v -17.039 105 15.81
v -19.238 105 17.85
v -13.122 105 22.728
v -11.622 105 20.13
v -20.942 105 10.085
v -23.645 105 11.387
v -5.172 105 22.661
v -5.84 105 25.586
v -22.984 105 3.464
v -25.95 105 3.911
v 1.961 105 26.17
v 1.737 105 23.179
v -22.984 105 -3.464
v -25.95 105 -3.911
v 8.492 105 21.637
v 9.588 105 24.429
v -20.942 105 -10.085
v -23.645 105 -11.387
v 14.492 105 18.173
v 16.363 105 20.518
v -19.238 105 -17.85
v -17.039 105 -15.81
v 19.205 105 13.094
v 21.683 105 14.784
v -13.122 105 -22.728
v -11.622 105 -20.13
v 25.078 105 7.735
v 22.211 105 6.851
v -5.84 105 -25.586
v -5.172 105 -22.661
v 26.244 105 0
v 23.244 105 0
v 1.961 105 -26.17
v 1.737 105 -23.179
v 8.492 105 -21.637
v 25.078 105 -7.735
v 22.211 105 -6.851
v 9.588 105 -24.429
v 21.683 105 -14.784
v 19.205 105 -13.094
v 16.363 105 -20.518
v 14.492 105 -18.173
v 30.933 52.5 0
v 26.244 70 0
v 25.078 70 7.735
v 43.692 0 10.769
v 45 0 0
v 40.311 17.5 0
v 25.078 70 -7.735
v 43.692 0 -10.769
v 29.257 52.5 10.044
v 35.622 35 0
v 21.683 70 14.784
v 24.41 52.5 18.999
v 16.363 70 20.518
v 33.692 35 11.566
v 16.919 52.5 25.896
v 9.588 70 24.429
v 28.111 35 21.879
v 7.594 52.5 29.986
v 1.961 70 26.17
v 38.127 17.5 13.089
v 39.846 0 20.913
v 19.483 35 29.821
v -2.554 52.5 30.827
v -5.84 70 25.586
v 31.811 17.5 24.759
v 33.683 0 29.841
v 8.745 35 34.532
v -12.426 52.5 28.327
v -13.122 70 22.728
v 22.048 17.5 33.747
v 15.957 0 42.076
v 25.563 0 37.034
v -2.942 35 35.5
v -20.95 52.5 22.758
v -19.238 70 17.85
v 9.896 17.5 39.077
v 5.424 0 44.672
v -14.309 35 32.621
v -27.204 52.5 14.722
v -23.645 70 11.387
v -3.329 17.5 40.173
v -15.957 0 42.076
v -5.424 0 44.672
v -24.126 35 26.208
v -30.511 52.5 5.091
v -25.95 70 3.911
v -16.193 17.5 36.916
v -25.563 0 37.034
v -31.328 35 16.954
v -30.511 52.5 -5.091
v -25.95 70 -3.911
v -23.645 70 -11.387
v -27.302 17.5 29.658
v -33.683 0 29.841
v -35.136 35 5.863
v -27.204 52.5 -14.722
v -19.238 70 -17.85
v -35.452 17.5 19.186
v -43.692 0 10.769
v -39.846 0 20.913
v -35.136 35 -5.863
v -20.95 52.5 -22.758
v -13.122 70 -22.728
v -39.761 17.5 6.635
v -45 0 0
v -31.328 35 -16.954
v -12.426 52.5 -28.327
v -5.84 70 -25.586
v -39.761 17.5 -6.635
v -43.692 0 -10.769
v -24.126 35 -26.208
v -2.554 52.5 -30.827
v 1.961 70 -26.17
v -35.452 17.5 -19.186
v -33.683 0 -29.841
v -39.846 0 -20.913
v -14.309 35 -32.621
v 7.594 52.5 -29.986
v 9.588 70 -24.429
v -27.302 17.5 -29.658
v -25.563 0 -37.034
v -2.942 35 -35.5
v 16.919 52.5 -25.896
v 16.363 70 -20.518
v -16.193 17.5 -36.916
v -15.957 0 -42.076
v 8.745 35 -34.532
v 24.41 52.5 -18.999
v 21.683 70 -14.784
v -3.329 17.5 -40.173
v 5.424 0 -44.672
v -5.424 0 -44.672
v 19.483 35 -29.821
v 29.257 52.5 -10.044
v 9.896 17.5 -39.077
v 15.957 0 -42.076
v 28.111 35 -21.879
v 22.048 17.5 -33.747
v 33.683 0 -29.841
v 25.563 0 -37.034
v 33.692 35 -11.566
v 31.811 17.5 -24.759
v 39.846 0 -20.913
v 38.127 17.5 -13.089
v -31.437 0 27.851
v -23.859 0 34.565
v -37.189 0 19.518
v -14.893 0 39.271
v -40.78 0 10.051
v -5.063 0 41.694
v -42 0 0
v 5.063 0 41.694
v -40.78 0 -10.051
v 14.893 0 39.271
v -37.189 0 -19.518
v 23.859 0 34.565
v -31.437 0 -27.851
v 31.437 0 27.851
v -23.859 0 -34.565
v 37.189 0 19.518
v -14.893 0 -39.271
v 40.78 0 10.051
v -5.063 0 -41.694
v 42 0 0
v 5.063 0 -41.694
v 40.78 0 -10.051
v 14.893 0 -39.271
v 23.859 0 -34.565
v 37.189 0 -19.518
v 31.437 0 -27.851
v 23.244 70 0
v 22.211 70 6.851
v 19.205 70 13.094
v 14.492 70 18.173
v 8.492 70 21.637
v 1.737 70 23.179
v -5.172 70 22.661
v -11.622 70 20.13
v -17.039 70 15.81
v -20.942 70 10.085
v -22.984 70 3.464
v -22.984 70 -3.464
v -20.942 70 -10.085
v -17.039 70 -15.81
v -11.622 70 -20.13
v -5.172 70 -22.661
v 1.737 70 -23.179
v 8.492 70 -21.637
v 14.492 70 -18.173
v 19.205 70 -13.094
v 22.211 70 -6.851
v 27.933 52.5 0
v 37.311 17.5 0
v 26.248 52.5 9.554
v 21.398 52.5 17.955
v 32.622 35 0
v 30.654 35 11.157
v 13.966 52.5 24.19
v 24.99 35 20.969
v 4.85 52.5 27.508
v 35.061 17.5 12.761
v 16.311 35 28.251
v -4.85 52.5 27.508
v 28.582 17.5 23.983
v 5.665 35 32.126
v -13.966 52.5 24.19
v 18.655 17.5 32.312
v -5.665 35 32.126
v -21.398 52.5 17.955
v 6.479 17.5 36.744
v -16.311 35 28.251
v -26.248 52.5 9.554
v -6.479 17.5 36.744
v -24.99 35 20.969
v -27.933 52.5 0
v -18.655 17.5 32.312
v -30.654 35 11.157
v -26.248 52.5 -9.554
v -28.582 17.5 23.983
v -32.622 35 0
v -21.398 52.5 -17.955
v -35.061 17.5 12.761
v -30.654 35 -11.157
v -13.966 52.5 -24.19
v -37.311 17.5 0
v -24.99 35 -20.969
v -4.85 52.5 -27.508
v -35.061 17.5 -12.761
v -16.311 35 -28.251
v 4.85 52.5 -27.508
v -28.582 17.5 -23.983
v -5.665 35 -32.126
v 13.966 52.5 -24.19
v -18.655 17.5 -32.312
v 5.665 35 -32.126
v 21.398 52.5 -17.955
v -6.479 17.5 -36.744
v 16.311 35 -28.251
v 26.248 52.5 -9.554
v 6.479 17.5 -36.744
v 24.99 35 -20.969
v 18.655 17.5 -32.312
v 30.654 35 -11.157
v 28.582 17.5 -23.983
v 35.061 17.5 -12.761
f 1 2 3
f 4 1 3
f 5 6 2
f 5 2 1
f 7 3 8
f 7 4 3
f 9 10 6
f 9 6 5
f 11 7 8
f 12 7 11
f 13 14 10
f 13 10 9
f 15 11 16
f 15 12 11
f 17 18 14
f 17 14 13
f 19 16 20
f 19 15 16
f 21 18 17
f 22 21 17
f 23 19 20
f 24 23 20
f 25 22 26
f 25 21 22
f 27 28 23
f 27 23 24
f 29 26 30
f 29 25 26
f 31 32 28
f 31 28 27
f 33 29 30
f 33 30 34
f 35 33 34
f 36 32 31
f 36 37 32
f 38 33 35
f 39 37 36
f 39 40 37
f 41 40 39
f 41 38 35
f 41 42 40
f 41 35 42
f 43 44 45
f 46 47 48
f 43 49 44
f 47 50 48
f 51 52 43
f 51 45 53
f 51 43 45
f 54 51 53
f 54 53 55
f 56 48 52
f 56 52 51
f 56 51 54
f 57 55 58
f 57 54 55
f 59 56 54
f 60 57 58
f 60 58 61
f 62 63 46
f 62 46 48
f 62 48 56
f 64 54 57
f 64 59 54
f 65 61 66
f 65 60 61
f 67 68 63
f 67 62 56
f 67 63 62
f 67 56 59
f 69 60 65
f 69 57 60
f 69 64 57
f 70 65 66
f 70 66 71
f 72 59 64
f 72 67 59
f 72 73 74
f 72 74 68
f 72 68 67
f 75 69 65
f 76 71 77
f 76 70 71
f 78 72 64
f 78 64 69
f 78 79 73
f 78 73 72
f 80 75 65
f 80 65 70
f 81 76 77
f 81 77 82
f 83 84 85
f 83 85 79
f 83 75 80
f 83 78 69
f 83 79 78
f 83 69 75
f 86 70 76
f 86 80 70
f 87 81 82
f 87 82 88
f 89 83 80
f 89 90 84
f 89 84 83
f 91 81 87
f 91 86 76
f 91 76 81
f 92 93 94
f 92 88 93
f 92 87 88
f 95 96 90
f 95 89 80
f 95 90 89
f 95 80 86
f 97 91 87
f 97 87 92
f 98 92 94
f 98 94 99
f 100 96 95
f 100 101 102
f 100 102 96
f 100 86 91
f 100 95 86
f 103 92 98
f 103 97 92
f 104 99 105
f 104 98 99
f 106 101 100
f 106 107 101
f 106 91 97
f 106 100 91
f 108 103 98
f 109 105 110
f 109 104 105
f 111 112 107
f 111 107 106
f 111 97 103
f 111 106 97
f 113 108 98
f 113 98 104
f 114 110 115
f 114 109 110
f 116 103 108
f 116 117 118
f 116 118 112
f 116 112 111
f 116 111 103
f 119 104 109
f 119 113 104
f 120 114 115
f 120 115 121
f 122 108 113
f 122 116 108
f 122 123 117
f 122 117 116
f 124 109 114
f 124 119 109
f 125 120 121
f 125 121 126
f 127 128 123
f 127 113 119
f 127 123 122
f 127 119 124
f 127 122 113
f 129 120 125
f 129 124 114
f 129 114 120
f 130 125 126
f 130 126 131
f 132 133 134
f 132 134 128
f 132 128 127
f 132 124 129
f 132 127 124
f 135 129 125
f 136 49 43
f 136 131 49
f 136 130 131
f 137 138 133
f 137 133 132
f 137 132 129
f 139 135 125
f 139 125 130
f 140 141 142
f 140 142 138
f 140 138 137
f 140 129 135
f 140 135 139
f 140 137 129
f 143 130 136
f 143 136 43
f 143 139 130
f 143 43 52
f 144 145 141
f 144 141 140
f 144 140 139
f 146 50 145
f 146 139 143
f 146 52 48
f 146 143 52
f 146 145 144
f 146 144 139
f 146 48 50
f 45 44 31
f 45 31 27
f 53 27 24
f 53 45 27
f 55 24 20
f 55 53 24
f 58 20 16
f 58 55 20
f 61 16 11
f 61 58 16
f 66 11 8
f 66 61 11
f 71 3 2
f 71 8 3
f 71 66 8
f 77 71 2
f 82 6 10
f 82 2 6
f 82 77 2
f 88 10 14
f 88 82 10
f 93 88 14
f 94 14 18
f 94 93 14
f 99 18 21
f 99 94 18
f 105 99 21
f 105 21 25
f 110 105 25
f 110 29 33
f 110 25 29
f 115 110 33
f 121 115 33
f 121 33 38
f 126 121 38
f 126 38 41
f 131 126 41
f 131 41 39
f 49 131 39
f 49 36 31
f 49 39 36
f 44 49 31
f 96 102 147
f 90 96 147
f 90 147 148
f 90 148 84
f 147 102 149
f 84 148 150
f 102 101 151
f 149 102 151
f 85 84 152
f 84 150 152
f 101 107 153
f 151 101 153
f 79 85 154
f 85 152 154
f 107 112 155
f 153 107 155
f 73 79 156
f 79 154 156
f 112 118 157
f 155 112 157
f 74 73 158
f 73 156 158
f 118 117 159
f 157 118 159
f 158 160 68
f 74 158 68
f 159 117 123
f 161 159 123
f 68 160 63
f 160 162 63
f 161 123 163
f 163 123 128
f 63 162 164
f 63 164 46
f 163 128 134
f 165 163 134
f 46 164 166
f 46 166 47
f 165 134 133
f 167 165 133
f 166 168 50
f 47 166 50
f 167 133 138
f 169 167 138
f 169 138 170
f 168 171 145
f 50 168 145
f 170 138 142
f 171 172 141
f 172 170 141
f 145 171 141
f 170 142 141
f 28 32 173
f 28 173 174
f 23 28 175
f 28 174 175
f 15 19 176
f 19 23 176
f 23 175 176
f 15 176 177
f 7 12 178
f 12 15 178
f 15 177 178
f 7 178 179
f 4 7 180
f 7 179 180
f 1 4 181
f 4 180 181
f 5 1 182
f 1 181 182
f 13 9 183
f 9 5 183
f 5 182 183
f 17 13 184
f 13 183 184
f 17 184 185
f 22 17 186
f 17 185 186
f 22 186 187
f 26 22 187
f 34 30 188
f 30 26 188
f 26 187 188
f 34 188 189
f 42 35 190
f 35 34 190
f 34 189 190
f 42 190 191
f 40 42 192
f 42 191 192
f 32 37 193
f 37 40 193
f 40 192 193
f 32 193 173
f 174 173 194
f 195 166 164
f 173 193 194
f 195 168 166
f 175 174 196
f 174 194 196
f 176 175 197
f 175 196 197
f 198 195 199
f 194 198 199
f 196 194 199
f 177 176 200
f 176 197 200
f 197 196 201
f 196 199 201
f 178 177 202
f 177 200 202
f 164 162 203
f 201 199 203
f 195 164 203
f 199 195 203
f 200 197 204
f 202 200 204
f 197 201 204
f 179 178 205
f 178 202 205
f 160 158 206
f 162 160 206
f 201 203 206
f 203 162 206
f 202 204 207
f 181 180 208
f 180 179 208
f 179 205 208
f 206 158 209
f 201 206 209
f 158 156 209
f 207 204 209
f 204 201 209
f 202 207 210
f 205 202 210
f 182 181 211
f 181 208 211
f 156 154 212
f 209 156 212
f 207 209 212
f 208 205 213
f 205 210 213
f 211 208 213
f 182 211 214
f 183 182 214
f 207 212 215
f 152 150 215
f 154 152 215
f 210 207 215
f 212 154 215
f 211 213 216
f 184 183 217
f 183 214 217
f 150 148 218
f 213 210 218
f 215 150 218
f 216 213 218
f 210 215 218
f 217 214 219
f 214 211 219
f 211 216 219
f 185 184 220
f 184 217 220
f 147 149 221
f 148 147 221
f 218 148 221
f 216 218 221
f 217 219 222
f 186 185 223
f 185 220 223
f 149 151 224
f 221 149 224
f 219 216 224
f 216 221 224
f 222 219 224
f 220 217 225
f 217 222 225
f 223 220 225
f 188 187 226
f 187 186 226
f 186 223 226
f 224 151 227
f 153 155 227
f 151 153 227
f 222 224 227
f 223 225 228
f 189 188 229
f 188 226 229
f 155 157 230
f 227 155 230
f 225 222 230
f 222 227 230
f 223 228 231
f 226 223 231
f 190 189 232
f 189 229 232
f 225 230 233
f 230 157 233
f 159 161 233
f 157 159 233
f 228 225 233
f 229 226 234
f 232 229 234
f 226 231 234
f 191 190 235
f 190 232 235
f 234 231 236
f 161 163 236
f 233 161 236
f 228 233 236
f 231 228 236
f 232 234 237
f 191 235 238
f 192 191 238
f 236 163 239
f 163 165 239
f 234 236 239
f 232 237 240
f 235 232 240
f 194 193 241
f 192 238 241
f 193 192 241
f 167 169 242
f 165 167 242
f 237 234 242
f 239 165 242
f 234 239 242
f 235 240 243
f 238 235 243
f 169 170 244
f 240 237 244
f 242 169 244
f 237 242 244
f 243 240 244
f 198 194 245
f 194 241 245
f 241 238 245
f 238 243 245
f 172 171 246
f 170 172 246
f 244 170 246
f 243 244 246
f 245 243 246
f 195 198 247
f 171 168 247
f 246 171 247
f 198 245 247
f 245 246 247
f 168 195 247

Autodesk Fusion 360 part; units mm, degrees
sketch "Sketch1" plane through (0, 0, 0) normal (0, 1, 0) x (1, 0, 0)
  circle A0 centre (0, 0) radius 45
  dimension "d1" = 90
extrude "Extrude1" add sketch "Sketch1" along normal blind 70 draft -15
sketch "Sketch2" plane through (0, 0, 0) normal (0, 1, 0) x (1, 0, 0)
  circle A0 centre (0, 0) radius 42
  dimension "d4" = 84
extrude "Extrude2" cut sketch "Sketch2" along normal blind 70 draft -15
extrude "Extrude3" add 1 faces at (25.1459, 70, 1.3038) along direction (0, 1, 0) blind 35
